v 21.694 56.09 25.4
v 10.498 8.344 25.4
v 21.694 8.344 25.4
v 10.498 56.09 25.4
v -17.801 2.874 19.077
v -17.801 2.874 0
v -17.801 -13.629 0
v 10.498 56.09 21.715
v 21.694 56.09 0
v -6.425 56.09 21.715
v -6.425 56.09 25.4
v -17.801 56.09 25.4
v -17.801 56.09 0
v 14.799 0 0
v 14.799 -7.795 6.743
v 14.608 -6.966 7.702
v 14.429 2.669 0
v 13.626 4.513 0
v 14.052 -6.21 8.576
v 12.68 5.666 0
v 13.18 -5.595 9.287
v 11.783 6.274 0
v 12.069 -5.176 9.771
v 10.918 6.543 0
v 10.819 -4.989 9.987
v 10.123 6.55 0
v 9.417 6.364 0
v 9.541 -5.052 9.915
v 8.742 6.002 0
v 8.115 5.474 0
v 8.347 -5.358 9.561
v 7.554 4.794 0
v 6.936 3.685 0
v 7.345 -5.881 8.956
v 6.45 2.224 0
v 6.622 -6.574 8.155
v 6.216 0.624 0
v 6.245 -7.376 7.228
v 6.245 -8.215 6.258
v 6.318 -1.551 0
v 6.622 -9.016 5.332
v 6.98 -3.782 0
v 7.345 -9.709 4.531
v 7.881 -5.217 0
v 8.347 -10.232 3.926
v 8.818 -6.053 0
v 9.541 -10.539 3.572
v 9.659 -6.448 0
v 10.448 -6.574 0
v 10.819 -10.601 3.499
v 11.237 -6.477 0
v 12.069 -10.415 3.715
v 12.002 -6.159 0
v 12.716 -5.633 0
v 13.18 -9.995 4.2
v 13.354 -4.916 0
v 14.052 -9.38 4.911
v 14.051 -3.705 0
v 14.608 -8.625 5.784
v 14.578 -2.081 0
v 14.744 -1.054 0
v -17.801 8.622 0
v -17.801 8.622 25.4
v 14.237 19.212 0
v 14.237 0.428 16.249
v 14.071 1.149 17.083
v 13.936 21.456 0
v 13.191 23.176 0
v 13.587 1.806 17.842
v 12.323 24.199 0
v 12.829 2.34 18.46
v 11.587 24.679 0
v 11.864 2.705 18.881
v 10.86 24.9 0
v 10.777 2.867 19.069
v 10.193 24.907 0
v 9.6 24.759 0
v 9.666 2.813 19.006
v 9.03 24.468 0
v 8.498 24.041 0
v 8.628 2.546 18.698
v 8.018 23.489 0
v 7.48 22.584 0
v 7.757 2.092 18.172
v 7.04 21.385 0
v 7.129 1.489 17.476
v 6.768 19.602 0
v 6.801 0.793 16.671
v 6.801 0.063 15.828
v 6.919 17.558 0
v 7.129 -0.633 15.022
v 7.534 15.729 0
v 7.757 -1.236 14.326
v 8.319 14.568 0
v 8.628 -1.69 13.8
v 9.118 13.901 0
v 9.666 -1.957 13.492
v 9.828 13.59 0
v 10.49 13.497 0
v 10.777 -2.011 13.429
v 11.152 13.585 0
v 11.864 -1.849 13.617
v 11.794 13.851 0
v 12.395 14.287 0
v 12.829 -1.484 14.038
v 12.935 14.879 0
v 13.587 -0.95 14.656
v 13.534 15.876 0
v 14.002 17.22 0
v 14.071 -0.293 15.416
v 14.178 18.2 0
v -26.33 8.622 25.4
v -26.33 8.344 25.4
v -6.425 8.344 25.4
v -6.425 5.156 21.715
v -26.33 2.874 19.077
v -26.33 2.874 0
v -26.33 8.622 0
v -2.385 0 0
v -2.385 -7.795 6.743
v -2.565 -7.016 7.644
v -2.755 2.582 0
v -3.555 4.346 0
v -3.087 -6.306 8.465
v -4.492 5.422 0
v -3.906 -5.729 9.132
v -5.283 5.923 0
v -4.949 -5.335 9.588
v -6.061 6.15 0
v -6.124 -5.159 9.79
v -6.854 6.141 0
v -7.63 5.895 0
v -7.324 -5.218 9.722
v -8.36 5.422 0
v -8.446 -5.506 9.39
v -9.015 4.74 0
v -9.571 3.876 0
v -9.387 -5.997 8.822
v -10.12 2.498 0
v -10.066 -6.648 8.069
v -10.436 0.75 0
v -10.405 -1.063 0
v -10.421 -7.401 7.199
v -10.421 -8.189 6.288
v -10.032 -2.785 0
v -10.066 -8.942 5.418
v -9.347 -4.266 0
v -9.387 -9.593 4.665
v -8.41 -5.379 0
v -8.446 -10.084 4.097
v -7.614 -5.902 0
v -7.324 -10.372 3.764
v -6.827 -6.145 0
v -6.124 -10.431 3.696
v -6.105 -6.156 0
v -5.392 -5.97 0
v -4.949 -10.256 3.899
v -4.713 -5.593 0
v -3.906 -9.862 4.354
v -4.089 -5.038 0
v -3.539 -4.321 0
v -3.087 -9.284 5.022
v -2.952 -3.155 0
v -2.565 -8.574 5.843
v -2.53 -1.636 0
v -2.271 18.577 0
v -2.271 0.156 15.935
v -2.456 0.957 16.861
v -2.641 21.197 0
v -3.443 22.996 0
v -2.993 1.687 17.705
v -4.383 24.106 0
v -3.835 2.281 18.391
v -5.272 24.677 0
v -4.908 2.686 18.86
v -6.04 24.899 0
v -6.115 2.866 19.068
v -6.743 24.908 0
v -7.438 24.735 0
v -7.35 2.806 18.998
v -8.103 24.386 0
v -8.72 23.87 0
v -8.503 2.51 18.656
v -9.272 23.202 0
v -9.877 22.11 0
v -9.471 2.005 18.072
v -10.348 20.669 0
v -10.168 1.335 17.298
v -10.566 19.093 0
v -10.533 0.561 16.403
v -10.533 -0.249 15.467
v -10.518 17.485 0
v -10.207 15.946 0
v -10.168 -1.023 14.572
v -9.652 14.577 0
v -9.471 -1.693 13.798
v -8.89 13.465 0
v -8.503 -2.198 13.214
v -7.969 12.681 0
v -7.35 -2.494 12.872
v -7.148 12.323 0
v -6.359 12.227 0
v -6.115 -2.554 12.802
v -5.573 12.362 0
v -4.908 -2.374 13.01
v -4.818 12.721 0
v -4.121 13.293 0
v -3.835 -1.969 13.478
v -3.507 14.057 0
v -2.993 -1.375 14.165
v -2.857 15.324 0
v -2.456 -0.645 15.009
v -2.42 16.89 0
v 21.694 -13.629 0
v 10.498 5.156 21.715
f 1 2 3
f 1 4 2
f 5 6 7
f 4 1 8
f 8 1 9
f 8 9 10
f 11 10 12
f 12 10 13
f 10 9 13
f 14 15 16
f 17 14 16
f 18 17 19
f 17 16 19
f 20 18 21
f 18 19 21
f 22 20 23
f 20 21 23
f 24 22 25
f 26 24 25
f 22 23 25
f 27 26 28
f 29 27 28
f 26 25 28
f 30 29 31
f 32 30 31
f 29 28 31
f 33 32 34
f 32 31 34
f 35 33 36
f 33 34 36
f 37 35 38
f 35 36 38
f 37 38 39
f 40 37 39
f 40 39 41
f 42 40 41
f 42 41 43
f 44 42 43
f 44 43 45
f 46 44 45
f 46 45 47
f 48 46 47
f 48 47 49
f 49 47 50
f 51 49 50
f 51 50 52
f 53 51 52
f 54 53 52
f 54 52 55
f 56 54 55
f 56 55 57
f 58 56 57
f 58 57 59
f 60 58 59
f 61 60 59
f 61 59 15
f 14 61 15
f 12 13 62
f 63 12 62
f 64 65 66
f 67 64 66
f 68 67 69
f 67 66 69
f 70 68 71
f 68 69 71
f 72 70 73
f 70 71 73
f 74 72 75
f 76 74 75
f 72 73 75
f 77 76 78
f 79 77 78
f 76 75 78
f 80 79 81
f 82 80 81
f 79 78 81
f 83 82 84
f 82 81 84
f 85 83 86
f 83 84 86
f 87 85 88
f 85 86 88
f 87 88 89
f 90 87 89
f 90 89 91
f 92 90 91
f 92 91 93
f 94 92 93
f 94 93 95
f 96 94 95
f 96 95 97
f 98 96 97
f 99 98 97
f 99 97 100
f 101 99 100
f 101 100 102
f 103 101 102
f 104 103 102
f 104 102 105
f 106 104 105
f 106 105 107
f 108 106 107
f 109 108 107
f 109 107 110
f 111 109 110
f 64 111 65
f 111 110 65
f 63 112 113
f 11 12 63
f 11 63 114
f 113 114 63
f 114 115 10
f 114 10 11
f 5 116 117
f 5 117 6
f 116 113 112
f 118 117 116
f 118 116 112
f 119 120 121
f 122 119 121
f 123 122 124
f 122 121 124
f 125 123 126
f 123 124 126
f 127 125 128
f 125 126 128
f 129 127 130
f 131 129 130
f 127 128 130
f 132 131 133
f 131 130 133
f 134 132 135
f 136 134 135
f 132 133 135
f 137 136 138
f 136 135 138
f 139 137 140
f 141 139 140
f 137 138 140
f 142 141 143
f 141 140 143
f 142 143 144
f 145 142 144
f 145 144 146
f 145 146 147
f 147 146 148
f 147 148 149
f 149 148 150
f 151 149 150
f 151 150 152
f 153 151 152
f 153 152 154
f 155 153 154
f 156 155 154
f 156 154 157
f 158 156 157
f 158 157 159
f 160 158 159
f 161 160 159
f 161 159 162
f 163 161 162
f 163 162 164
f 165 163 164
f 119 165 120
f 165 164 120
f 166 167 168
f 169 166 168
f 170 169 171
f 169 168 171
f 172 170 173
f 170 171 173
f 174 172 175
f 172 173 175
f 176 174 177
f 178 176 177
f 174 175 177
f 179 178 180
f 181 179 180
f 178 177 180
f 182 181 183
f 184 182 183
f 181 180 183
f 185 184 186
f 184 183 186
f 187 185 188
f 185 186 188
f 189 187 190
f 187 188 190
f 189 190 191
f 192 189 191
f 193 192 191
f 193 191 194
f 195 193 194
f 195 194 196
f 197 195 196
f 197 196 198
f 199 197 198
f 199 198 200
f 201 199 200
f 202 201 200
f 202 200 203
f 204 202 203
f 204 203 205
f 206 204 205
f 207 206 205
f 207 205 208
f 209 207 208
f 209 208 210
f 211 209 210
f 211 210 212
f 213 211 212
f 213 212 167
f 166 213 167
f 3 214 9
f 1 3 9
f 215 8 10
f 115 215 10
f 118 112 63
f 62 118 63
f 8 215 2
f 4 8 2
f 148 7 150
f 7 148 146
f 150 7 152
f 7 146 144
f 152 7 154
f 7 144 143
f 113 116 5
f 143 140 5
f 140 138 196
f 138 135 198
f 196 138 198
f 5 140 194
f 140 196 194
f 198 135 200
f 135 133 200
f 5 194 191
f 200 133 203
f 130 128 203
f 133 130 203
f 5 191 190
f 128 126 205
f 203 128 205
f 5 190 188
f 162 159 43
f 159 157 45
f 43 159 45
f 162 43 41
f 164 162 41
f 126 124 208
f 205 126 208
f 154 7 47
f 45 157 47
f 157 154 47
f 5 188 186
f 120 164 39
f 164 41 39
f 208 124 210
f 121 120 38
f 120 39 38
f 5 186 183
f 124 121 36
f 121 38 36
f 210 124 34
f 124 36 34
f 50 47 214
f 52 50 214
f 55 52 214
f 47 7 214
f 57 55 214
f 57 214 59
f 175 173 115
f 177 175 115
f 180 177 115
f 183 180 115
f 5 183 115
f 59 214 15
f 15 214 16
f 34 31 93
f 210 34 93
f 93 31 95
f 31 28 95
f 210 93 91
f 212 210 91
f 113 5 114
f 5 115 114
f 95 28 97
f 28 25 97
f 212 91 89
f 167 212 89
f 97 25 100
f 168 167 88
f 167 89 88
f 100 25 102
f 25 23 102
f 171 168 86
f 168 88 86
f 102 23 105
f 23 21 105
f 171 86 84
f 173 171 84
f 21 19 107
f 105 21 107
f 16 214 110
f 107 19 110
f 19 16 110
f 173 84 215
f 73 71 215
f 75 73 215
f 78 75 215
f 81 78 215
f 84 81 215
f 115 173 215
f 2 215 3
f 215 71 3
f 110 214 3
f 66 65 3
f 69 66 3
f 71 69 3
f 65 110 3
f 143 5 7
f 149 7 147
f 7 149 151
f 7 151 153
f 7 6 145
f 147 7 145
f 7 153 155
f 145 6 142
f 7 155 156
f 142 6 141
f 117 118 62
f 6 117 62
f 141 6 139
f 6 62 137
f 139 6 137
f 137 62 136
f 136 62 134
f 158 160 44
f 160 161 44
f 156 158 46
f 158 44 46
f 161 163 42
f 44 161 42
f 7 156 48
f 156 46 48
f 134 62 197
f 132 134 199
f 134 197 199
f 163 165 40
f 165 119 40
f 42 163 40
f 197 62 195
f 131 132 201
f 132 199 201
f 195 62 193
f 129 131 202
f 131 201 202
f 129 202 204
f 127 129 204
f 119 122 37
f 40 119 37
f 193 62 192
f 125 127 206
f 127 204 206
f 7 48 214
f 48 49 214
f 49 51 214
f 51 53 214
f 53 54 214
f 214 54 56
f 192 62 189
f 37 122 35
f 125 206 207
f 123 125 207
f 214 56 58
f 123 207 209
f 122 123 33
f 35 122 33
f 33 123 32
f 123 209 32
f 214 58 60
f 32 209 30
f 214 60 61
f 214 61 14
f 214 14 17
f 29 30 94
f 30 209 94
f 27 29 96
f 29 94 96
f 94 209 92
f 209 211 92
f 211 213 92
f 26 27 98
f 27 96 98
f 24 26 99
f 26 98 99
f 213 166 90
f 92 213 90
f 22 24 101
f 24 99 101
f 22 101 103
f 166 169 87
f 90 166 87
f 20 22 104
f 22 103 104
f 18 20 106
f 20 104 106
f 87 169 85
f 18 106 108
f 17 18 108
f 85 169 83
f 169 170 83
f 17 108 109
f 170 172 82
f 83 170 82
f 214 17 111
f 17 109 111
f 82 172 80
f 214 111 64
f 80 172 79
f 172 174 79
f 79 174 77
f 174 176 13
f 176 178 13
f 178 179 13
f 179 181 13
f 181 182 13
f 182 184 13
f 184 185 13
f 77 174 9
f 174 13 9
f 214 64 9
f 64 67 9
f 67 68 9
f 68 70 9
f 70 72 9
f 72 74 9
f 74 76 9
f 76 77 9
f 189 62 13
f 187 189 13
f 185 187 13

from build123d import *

# Parameters (mm, degrees)
F1_W     = 8.5294544697
F1_H     = 5.7481119875
F2_DEPTH = 25.4
F4_DEPTH = 48.0255407671
F5_W     = 16.9233079068
F5_H     = 3.6851934433
F6_DEPTH = 69.7200267965
F7_R     = 4.0401840977
F7_R_2   = 4.3013200875
F7_R_3   = 4.1544186405
F7_R_4   = 3.7387935899
F8_DEPTH = 52.7287156055


with BuildPart() as f2:
    # F1 (on face) → F2 (new body)
    with BuildSketch(Plane.XY):
        Polygon((21.6944832355, -13.6285861954), (21.6944832355, 56.0904406011), (-17.8006030619, 56.0904406011), (-17.8006030619, 8.622167632), (-17.8006030619, 2.8740556445), (-17.8006030619, -13.6285861954), align=None)
        with Locations((-22.0653302968, 5.7481116382)):
            Rectangle(F1_W, F1_H)
    extrude(amount=F2_DEPTH)

    # F3 (on face) → F4 (cut, through all)
    with BuildSketch(Plane.YZ.offset(21.6944832355)):
        Polygon((-13.6285861954, 25.4), (-13.6285861954, 0), (8.3440328017, 25.4), align=None)
    extrude(amount=-F4_DEPTH, mode=Mode.SUBTRACT)

    # F5 (on face) → F6 (cut, through all)
    with BuildSketch(Plane(origin=(0, 56.0904406011, 0), x_dir=(-1, 0, 0), z_dir=(0, 1, 0))):
        with Locations((-2.0361964125, 23.5574032784)):
            Rectangle(F5_W, F5_H)
    extrude(amount=-F6_DEPTH, mode=Mode.SUBTRACT)

    # F7 (on face) → F8 (cut, through all)
    with BuildSketch(Plane(origin=(0, -7.7951788741, 6.7433265912), x_dir=(1, 0, 0), z_dir=(0, -0.7562887497, 0.6542379744))):
        with Locations((-6.4254575409, 0)):
            Circle(F7_R)
        with Locations((10.4978503659, 0)):
            Circle(F7_R_2)
        with Locations((-6.4254575409, 12.1534615755)):
            Circle(F7_R_3)
        with Locations((10.4978503659, 12.5690866262)):
            Circle(F7_R_4)
    extrude(amount=-F8_DEPTH, mode=Mode.SUBTRACT)


solid = f2.part
